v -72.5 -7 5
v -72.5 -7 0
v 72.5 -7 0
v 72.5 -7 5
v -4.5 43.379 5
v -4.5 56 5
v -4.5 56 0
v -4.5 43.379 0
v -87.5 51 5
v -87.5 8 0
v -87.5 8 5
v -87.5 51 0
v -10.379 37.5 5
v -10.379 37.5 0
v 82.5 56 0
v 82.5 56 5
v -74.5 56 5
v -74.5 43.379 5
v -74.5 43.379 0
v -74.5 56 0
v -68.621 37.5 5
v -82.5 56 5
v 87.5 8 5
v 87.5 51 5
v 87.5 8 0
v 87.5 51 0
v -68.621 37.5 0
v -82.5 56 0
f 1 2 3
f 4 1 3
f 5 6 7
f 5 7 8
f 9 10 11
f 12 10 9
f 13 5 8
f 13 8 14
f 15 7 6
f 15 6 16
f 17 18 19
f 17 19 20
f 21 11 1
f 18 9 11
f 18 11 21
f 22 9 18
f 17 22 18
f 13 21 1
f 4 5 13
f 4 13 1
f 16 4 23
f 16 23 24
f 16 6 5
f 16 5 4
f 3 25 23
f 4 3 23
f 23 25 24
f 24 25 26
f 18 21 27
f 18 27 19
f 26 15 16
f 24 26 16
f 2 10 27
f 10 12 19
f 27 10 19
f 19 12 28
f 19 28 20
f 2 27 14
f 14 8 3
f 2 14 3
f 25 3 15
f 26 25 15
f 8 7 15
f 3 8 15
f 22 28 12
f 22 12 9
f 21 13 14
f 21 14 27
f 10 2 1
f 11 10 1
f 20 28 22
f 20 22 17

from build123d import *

# Parameters (mm, degrees)
SKETCH_1_W          = 175
SKETCH_1_H          = 63
EXTRUDE_1_DEPTH     = 5
CUT_EXTRUDE_1_REACH = 106.006
CHAMFER_1_SIZE      = 15
CHAMFER_2_SIZE      = 5


with BuildPart() as part:
    # 草图1 → 凸台-拉伸1 (new body)
    with BuildSketch(Plane.XY):
        with Locations((0, 24.5)):
            Rectangle(SKETCH_1_W, SKETCH_1_H)
    extrude(amount=EXTRUDE_1_DEPTH)

    # 草图2 → 切除-拉伸1 (cut, up to next)
    with BuildSketch(Plane.XY.offset(5), mode=Mode.PRIVATE) as cut_extrude_1_sk1:
        Polygon((-74.5, 56), (-4.5, 56), (-4.5, 43.378679656), (-10.378679656, 37.5), (-68.621320344, 37.5), (-74.5, 43.378679656), align=None)
    cut_extrude_1_tool1 = extrude(cut_extrude_1_sk1.sketch, amount=-CUT_EXTRUDE_1_REACH, mode=Mode.PRIVATE) & part.part
    add(cut_extrude_1_tool1.solids().sort_by_distance((-39.5, 46.94989, 5))[0], mode=Mode.SUBTRACT)

    # 倒角1
    chamfer_1_edges = [part.edges().sort_by_distance(p)[0] for p in [
        (87.5, -7, 2.5),
        (-87.5, -7, 2.5),
    ]]
    chamfer(chamfer_1_edges, length=CHAMFER_1_SIZE)

    # 倒角2
    chamfer_2_edges = [part.edges().sort_by_distance(p)[0] for p in [
        (-87.5, 56, 2.5),
        (87.5, 56, 2.5),
    ]]
    chamfer(chamfer_2_edges, length=CHAMFER_2_SIZE)


solid = part.part
